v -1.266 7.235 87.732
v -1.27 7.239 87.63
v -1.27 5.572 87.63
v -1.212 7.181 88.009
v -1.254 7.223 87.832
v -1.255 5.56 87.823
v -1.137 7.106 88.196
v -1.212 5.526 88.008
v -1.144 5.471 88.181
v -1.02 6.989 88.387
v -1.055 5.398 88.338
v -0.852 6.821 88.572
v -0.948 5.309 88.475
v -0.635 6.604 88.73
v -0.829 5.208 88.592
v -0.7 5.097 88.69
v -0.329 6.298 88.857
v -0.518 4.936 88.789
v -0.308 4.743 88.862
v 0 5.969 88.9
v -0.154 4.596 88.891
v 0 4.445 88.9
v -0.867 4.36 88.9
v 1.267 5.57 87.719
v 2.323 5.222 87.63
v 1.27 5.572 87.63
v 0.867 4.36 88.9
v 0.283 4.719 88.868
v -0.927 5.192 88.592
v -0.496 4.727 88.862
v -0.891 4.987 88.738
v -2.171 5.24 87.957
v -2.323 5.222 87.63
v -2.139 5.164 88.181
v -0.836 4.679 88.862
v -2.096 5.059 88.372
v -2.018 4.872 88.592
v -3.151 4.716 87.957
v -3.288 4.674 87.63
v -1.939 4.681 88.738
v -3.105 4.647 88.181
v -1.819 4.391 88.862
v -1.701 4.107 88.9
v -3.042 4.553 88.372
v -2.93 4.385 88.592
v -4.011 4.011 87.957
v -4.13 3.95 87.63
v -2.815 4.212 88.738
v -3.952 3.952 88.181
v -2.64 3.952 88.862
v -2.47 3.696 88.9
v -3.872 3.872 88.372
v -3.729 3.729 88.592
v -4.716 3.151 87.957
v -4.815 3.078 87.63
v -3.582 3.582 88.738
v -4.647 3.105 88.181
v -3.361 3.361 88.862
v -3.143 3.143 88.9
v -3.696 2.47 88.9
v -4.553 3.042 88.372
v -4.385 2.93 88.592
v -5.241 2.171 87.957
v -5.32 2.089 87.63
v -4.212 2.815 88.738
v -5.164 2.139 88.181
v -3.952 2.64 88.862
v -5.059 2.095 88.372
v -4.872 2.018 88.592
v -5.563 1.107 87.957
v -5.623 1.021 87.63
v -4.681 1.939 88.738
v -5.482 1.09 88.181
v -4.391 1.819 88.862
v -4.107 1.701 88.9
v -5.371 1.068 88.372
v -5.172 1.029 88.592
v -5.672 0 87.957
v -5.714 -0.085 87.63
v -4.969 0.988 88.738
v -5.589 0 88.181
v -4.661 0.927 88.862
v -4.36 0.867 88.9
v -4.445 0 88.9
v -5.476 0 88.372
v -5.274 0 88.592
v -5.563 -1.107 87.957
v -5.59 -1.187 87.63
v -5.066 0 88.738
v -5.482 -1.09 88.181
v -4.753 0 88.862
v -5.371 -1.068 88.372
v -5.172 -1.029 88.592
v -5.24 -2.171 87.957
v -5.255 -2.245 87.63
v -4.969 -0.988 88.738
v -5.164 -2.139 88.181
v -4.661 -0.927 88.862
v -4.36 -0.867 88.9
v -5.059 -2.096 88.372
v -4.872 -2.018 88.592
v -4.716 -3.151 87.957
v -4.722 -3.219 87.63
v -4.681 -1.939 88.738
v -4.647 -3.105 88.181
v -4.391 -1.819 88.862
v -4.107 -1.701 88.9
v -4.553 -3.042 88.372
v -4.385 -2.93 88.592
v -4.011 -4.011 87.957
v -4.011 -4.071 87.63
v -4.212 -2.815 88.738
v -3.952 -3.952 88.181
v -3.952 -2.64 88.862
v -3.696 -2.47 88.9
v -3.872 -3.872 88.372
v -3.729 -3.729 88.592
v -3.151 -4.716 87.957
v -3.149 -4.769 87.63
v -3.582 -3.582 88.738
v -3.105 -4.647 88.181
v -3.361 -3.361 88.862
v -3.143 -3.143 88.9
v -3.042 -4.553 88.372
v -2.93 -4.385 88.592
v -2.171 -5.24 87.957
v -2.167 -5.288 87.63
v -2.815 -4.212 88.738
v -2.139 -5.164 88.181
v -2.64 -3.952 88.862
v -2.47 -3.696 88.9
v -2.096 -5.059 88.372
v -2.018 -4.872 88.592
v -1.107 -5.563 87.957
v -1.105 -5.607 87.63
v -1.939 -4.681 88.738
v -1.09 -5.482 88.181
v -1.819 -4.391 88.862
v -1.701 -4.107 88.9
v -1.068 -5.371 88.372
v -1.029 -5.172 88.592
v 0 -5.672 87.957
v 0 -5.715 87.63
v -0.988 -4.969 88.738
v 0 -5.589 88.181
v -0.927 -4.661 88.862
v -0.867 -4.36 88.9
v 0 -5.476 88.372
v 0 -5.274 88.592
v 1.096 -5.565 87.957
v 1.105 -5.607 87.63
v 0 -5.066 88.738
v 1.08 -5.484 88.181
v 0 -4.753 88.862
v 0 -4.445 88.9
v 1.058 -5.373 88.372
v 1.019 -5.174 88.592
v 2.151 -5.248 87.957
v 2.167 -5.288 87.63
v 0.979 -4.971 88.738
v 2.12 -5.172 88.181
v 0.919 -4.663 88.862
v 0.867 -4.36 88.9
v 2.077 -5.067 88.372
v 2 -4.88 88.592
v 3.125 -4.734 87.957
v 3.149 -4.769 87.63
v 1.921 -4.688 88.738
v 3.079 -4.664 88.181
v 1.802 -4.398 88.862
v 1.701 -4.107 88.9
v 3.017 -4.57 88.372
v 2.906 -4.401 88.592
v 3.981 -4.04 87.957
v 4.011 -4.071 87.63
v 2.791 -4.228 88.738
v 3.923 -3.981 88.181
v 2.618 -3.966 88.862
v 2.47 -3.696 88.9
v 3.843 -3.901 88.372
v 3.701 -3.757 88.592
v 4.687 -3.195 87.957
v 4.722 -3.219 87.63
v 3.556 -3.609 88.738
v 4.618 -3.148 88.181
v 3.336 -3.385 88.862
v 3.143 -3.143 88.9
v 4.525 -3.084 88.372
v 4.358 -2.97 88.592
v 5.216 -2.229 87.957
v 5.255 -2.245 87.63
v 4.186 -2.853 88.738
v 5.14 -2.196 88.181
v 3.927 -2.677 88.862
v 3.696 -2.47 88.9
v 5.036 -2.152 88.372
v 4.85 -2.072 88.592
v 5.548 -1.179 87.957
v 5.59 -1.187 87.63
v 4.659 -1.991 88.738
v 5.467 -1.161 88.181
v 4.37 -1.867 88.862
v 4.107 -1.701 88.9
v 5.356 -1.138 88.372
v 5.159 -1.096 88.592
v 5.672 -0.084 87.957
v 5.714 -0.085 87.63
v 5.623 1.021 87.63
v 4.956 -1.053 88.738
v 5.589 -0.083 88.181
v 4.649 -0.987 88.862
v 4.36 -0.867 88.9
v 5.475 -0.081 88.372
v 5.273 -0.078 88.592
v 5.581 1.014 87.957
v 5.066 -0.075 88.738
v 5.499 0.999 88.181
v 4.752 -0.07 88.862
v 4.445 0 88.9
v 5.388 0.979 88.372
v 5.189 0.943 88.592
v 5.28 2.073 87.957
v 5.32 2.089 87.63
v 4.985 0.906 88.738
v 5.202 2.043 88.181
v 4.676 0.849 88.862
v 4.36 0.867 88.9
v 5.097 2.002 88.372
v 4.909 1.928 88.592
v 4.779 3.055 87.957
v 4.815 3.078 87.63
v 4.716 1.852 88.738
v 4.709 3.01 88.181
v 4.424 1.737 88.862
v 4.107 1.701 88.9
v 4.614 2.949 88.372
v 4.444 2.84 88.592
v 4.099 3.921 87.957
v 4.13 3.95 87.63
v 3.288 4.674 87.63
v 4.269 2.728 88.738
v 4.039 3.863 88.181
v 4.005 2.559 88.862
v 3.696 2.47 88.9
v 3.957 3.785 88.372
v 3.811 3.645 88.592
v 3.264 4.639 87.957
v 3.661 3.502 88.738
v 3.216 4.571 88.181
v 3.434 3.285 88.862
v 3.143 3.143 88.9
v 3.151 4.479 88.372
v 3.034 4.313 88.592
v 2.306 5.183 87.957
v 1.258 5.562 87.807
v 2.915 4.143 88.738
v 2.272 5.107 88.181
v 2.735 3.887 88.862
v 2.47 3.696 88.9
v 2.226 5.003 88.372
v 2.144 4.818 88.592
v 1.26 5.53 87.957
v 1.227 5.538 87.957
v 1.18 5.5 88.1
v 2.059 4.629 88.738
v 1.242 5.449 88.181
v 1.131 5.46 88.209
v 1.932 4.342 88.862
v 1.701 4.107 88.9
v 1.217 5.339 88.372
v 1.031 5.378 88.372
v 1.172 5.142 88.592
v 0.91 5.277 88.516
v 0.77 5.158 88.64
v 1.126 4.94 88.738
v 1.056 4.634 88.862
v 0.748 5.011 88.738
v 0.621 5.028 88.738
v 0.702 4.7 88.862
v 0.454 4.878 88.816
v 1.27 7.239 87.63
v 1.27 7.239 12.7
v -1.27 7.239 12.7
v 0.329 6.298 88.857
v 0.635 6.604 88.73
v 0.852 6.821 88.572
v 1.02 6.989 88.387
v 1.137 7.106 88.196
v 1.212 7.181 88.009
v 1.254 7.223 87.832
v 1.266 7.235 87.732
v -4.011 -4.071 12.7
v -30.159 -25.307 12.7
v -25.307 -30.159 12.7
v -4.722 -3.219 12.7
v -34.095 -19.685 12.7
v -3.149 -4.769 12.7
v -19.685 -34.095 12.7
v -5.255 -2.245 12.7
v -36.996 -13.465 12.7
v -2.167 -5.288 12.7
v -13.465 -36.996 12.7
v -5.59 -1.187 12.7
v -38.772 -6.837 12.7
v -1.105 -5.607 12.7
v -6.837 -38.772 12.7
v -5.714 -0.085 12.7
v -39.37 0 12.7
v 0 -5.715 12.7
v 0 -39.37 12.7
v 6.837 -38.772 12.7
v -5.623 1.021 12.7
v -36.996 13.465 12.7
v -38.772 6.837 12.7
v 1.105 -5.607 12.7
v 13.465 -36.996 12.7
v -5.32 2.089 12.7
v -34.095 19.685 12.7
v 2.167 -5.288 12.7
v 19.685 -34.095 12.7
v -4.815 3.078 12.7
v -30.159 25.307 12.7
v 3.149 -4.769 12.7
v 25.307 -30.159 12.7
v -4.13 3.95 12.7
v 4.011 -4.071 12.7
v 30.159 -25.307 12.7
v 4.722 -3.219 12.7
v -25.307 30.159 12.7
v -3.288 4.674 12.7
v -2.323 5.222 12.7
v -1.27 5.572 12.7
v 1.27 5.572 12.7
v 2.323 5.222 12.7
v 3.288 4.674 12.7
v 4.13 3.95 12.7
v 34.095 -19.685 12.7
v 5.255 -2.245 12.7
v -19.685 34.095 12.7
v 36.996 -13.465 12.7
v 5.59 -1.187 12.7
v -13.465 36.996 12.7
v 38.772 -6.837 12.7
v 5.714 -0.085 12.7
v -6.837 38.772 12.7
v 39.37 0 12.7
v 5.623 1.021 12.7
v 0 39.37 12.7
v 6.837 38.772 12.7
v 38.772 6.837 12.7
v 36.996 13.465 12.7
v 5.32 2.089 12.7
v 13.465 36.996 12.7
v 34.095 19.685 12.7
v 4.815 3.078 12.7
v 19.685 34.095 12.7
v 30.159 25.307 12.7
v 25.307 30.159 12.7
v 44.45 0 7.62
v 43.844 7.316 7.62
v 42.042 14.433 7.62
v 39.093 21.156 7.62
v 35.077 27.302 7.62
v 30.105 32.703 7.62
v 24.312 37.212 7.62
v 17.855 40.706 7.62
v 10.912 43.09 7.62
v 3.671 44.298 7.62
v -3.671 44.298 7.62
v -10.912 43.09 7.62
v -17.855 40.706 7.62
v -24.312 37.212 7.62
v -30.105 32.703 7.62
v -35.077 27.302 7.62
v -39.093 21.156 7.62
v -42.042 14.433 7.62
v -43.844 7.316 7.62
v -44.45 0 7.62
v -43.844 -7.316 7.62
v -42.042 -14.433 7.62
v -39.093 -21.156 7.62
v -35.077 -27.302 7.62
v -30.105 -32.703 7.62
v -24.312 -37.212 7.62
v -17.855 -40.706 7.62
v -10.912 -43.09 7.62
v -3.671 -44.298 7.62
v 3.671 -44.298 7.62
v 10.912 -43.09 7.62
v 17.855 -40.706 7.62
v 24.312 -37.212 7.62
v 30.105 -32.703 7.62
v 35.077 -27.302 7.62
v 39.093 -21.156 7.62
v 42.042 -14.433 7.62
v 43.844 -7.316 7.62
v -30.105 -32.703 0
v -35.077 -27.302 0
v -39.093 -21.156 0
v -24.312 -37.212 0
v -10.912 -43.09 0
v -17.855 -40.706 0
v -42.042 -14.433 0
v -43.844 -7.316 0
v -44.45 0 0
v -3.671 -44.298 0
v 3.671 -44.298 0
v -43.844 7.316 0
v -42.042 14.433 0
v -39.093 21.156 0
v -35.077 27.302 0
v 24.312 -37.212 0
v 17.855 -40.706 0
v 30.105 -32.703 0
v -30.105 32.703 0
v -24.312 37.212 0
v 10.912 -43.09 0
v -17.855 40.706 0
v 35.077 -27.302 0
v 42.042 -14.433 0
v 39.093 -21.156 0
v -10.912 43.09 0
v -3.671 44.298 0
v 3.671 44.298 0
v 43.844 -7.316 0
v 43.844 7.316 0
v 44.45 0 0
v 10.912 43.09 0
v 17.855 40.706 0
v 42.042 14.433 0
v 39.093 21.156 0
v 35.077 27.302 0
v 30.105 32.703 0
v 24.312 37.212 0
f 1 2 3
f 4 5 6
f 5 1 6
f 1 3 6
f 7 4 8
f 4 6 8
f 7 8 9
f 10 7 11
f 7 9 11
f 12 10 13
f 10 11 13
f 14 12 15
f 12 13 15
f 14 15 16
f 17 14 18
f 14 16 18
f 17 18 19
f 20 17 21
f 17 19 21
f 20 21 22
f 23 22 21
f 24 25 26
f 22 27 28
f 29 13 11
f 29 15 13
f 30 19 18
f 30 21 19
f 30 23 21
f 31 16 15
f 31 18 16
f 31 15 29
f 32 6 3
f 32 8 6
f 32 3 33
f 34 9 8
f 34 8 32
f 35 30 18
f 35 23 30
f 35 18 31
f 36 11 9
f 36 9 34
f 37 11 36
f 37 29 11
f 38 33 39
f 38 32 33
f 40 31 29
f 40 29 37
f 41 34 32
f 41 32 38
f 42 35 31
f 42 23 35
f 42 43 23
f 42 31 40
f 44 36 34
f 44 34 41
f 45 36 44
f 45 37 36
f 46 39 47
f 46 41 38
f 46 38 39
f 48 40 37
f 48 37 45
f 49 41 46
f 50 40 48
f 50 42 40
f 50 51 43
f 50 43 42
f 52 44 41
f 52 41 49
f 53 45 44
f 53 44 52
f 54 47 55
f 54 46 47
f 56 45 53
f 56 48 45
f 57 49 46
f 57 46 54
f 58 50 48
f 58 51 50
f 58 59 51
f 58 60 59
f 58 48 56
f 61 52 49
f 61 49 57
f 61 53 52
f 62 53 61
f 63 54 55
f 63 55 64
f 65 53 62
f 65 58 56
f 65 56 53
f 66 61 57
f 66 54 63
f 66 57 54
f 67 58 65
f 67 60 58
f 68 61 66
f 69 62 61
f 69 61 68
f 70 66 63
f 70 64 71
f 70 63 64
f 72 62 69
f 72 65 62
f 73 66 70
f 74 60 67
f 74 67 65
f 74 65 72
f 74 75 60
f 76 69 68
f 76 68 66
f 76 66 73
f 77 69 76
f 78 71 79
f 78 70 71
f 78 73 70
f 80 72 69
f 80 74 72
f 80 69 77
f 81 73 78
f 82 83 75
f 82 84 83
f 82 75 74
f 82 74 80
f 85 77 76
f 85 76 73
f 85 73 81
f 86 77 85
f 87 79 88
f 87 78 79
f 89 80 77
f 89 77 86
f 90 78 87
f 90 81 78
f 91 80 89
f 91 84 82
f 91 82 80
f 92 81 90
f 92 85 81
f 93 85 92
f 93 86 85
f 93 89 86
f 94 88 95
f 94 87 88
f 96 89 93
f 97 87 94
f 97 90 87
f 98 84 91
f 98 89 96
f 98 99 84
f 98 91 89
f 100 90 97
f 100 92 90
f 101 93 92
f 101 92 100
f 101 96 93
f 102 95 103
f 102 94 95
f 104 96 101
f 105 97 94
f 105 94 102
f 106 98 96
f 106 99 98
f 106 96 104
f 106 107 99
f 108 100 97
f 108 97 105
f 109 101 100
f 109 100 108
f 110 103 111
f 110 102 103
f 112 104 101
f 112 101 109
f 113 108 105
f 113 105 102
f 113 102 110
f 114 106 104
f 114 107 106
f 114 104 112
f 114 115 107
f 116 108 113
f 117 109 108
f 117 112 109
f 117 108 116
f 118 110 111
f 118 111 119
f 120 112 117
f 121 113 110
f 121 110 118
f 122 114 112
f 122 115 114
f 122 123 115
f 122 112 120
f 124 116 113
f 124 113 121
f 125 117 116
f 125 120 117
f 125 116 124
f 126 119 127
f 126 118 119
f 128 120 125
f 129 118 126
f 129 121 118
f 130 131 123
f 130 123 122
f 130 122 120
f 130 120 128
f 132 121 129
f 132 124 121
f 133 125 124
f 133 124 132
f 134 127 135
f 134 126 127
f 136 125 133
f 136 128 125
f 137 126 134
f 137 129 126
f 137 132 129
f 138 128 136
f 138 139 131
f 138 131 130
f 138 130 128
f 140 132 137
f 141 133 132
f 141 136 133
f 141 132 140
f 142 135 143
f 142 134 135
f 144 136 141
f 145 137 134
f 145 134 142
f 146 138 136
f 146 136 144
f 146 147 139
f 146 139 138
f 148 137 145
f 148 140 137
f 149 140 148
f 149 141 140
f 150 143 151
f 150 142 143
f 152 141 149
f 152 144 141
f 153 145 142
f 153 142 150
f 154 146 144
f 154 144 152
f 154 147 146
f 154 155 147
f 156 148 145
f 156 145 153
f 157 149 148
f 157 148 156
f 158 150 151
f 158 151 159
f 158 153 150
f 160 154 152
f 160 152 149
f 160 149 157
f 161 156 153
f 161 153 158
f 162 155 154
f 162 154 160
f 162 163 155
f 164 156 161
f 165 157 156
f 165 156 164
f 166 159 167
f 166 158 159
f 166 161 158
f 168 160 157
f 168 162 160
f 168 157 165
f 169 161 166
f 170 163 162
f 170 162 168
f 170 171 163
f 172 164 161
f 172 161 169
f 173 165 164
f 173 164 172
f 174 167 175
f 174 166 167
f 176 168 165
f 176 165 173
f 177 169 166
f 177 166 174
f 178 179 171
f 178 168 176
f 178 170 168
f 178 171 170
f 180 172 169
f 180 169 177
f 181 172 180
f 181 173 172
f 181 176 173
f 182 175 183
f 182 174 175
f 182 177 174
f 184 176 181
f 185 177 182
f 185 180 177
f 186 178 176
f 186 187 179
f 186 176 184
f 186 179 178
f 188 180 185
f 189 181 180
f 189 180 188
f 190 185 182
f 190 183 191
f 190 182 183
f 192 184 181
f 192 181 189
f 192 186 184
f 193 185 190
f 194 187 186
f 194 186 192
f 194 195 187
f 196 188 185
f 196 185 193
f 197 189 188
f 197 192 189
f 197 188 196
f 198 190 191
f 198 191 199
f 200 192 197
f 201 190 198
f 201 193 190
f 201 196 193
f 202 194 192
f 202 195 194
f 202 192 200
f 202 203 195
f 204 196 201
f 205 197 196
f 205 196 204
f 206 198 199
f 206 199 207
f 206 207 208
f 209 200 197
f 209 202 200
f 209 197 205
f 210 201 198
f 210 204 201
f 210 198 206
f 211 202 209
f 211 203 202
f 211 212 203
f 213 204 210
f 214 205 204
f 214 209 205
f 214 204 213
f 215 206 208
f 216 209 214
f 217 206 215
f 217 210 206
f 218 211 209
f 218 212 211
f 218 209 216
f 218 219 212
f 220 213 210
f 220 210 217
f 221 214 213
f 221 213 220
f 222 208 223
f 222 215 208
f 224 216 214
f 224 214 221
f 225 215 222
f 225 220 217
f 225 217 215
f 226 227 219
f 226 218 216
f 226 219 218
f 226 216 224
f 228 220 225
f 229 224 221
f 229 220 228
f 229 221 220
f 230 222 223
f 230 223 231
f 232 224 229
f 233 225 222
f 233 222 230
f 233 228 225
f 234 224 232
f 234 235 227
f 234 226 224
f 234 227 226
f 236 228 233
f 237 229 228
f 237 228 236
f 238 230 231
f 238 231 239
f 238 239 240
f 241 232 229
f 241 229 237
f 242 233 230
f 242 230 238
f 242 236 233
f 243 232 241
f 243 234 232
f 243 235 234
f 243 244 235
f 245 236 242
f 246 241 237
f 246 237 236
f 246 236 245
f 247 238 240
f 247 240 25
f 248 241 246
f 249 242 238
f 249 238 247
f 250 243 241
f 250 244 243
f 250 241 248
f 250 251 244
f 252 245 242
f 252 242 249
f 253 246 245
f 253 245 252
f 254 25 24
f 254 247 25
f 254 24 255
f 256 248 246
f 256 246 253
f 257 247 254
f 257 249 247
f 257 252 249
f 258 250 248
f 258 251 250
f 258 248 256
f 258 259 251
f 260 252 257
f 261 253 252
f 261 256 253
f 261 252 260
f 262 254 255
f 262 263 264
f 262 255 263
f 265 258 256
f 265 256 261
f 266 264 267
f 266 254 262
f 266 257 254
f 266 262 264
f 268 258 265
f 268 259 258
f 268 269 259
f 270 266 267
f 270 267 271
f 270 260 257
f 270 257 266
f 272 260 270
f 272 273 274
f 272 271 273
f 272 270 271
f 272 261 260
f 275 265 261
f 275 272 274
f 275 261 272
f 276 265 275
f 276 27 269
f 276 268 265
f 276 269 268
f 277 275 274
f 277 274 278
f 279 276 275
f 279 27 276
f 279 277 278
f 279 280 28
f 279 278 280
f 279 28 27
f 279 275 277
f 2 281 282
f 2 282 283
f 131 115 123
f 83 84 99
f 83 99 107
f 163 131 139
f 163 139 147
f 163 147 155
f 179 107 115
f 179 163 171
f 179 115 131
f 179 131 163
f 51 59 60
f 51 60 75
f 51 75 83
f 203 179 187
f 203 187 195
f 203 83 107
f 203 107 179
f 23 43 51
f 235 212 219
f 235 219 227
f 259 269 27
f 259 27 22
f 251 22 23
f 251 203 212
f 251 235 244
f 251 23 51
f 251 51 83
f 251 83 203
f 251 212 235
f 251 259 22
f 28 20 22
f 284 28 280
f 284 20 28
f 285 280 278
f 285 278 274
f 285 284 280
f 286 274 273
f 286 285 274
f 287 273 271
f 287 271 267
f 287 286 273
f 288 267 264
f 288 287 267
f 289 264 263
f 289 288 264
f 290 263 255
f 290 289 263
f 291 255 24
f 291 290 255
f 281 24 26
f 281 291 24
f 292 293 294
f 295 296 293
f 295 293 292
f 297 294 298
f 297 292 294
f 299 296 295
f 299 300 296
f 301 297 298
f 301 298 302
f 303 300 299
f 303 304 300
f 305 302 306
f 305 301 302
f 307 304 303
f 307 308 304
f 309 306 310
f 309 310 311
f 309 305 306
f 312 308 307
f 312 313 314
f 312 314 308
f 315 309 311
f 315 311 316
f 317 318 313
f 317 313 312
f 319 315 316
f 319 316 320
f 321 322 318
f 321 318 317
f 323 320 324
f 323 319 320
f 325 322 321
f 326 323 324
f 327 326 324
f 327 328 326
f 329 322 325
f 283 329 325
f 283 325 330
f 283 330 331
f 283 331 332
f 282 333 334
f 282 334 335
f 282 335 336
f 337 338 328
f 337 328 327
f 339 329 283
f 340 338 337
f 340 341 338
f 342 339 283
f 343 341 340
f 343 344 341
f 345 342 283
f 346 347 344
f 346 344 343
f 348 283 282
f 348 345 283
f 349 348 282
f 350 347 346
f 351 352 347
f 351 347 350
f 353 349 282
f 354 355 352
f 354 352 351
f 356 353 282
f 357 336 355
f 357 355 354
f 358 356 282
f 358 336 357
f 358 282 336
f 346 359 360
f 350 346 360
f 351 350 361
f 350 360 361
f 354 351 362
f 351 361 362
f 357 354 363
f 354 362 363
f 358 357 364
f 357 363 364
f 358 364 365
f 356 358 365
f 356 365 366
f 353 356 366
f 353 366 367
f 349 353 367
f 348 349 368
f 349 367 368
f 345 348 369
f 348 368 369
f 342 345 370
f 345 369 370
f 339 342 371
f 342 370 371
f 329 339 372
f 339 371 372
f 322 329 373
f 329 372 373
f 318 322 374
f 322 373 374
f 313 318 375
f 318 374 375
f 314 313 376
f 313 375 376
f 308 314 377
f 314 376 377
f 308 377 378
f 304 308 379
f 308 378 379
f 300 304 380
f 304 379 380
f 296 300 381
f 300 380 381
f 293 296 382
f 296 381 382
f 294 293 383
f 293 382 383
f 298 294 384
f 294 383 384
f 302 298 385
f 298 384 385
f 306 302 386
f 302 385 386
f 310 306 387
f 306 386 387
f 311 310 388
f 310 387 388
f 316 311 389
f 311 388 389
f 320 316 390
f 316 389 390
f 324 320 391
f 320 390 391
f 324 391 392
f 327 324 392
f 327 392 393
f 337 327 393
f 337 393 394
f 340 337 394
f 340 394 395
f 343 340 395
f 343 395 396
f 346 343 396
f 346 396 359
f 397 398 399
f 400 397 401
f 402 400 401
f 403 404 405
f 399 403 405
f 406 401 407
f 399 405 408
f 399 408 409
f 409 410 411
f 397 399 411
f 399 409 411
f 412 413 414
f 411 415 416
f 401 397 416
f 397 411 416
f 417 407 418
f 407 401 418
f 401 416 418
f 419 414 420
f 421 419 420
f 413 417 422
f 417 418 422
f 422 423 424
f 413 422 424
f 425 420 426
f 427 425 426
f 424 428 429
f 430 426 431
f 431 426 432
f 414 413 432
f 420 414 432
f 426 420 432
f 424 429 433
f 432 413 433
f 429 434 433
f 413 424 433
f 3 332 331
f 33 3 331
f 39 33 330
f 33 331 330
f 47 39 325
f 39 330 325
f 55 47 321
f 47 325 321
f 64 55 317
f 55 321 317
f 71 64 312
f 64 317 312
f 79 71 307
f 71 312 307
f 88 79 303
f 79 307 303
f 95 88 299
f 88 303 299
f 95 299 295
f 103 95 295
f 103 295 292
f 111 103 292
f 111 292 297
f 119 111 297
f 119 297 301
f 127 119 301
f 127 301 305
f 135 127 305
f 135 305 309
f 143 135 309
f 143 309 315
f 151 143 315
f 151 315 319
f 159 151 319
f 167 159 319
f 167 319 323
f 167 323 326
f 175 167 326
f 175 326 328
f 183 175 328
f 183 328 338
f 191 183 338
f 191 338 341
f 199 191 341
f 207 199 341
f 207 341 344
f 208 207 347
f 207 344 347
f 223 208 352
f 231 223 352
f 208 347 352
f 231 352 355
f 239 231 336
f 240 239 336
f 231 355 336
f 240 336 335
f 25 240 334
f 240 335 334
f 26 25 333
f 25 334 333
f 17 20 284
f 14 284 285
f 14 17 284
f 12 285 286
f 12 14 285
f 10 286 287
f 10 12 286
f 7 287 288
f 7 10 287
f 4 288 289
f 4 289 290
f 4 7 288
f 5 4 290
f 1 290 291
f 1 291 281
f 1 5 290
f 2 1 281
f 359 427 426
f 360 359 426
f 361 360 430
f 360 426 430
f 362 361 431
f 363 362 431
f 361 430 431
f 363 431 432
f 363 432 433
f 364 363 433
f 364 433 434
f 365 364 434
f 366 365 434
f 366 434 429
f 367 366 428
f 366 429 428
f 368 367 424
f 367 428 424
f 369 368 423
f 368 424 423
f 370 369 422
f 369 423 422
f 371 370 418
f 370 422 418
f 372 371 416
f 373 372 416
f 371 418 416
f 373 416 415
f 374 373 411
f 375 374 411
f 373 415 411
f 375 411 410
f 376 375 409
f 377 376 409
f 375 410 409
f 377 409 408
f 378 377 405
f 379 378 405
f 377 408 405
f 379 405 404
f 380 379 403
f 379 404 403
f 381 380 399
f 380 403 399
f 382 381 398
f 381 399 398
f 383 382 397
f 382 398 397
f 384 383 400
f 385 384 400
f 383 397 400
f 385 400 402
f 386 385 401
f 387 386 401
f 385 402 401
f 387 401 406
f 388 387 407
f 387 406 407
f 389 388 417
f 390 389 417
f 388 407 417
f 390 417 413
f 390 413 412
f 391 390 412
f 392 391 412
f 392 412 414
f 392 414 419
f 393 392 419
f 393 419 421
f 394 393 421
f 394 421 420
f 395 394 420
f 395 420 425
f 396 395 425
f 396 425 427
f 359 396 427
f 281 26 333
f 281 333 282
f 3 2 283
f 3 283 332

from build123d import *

# Parameters (mm, degrees)
F0_R     = 44.45
F1_DEPTH = 12.7
F2_DEPTH = 88.9
F3_R     = 1.2699
F4_SIZE  = 5.08


# Not quite as in the source:
# - a fillet or chamfer is up to 0.001 mm smaller than in the source, because OpenCascade refuses the exact size


with BuildPart() as f1:
    # F0 (on Top) → F1 (new body)
    with BuildSketch(Plane.XY):
        Circle(F0_R)
        with BuildLine():
            ThreePointArc((1.27, 5.572102386), (0, -5.715), (-1.27, 5.572102386))
            Line((-1.27, 5.572102386), (-1.27, 7.239))
            Line((-1.27, 7.239), (1.27, 7.239))
            Line((1.27, 7.239), (1.27, 5.572102386))
        make_face(mode=Mode.SUBTRACT)
    extrude(amount=F1_DEPTH)

    # F0 (on Top) → F2 (join)
    with BuildSketch(Plane.XY):
        with BuildLine():
            Line((-1.27, 7.239), (-1.27, 5.572102386))
            ThreePointArc((-1.27, 5.572102386), (0, -5.715), (1.27, 5.572102386))
            Line((1.27, 5.572102386), (1.27, 7.239))
            Line((1.27, 7.239), (-1.27, 7.239))
        make_face()
    extrude(amount=F2_DEPTH)

    # F3 (radius 1.27 in the source; OpenCascade refuses exactly that, so slightly less here)
    f3_edges = [f1.edges().sort_by_distance(p)[0] for p in [
        (1.27, 6.405551, 88.9),
        (0, 7.239, 88.9),
        (-1.27, 6.405551, 88.9),
        (0, -5.715, 88.9),
    ]]
    fillet(f3_edges, radius=F3_R)

    # F4
    f4_edges = [f1.edges().sort_by_distance(p)[0] for p in [
        (-44.45, 0, 12.7),
    ]]
    chamfer(f4_edges, length=F4_SIZE)


solid = f1.part
